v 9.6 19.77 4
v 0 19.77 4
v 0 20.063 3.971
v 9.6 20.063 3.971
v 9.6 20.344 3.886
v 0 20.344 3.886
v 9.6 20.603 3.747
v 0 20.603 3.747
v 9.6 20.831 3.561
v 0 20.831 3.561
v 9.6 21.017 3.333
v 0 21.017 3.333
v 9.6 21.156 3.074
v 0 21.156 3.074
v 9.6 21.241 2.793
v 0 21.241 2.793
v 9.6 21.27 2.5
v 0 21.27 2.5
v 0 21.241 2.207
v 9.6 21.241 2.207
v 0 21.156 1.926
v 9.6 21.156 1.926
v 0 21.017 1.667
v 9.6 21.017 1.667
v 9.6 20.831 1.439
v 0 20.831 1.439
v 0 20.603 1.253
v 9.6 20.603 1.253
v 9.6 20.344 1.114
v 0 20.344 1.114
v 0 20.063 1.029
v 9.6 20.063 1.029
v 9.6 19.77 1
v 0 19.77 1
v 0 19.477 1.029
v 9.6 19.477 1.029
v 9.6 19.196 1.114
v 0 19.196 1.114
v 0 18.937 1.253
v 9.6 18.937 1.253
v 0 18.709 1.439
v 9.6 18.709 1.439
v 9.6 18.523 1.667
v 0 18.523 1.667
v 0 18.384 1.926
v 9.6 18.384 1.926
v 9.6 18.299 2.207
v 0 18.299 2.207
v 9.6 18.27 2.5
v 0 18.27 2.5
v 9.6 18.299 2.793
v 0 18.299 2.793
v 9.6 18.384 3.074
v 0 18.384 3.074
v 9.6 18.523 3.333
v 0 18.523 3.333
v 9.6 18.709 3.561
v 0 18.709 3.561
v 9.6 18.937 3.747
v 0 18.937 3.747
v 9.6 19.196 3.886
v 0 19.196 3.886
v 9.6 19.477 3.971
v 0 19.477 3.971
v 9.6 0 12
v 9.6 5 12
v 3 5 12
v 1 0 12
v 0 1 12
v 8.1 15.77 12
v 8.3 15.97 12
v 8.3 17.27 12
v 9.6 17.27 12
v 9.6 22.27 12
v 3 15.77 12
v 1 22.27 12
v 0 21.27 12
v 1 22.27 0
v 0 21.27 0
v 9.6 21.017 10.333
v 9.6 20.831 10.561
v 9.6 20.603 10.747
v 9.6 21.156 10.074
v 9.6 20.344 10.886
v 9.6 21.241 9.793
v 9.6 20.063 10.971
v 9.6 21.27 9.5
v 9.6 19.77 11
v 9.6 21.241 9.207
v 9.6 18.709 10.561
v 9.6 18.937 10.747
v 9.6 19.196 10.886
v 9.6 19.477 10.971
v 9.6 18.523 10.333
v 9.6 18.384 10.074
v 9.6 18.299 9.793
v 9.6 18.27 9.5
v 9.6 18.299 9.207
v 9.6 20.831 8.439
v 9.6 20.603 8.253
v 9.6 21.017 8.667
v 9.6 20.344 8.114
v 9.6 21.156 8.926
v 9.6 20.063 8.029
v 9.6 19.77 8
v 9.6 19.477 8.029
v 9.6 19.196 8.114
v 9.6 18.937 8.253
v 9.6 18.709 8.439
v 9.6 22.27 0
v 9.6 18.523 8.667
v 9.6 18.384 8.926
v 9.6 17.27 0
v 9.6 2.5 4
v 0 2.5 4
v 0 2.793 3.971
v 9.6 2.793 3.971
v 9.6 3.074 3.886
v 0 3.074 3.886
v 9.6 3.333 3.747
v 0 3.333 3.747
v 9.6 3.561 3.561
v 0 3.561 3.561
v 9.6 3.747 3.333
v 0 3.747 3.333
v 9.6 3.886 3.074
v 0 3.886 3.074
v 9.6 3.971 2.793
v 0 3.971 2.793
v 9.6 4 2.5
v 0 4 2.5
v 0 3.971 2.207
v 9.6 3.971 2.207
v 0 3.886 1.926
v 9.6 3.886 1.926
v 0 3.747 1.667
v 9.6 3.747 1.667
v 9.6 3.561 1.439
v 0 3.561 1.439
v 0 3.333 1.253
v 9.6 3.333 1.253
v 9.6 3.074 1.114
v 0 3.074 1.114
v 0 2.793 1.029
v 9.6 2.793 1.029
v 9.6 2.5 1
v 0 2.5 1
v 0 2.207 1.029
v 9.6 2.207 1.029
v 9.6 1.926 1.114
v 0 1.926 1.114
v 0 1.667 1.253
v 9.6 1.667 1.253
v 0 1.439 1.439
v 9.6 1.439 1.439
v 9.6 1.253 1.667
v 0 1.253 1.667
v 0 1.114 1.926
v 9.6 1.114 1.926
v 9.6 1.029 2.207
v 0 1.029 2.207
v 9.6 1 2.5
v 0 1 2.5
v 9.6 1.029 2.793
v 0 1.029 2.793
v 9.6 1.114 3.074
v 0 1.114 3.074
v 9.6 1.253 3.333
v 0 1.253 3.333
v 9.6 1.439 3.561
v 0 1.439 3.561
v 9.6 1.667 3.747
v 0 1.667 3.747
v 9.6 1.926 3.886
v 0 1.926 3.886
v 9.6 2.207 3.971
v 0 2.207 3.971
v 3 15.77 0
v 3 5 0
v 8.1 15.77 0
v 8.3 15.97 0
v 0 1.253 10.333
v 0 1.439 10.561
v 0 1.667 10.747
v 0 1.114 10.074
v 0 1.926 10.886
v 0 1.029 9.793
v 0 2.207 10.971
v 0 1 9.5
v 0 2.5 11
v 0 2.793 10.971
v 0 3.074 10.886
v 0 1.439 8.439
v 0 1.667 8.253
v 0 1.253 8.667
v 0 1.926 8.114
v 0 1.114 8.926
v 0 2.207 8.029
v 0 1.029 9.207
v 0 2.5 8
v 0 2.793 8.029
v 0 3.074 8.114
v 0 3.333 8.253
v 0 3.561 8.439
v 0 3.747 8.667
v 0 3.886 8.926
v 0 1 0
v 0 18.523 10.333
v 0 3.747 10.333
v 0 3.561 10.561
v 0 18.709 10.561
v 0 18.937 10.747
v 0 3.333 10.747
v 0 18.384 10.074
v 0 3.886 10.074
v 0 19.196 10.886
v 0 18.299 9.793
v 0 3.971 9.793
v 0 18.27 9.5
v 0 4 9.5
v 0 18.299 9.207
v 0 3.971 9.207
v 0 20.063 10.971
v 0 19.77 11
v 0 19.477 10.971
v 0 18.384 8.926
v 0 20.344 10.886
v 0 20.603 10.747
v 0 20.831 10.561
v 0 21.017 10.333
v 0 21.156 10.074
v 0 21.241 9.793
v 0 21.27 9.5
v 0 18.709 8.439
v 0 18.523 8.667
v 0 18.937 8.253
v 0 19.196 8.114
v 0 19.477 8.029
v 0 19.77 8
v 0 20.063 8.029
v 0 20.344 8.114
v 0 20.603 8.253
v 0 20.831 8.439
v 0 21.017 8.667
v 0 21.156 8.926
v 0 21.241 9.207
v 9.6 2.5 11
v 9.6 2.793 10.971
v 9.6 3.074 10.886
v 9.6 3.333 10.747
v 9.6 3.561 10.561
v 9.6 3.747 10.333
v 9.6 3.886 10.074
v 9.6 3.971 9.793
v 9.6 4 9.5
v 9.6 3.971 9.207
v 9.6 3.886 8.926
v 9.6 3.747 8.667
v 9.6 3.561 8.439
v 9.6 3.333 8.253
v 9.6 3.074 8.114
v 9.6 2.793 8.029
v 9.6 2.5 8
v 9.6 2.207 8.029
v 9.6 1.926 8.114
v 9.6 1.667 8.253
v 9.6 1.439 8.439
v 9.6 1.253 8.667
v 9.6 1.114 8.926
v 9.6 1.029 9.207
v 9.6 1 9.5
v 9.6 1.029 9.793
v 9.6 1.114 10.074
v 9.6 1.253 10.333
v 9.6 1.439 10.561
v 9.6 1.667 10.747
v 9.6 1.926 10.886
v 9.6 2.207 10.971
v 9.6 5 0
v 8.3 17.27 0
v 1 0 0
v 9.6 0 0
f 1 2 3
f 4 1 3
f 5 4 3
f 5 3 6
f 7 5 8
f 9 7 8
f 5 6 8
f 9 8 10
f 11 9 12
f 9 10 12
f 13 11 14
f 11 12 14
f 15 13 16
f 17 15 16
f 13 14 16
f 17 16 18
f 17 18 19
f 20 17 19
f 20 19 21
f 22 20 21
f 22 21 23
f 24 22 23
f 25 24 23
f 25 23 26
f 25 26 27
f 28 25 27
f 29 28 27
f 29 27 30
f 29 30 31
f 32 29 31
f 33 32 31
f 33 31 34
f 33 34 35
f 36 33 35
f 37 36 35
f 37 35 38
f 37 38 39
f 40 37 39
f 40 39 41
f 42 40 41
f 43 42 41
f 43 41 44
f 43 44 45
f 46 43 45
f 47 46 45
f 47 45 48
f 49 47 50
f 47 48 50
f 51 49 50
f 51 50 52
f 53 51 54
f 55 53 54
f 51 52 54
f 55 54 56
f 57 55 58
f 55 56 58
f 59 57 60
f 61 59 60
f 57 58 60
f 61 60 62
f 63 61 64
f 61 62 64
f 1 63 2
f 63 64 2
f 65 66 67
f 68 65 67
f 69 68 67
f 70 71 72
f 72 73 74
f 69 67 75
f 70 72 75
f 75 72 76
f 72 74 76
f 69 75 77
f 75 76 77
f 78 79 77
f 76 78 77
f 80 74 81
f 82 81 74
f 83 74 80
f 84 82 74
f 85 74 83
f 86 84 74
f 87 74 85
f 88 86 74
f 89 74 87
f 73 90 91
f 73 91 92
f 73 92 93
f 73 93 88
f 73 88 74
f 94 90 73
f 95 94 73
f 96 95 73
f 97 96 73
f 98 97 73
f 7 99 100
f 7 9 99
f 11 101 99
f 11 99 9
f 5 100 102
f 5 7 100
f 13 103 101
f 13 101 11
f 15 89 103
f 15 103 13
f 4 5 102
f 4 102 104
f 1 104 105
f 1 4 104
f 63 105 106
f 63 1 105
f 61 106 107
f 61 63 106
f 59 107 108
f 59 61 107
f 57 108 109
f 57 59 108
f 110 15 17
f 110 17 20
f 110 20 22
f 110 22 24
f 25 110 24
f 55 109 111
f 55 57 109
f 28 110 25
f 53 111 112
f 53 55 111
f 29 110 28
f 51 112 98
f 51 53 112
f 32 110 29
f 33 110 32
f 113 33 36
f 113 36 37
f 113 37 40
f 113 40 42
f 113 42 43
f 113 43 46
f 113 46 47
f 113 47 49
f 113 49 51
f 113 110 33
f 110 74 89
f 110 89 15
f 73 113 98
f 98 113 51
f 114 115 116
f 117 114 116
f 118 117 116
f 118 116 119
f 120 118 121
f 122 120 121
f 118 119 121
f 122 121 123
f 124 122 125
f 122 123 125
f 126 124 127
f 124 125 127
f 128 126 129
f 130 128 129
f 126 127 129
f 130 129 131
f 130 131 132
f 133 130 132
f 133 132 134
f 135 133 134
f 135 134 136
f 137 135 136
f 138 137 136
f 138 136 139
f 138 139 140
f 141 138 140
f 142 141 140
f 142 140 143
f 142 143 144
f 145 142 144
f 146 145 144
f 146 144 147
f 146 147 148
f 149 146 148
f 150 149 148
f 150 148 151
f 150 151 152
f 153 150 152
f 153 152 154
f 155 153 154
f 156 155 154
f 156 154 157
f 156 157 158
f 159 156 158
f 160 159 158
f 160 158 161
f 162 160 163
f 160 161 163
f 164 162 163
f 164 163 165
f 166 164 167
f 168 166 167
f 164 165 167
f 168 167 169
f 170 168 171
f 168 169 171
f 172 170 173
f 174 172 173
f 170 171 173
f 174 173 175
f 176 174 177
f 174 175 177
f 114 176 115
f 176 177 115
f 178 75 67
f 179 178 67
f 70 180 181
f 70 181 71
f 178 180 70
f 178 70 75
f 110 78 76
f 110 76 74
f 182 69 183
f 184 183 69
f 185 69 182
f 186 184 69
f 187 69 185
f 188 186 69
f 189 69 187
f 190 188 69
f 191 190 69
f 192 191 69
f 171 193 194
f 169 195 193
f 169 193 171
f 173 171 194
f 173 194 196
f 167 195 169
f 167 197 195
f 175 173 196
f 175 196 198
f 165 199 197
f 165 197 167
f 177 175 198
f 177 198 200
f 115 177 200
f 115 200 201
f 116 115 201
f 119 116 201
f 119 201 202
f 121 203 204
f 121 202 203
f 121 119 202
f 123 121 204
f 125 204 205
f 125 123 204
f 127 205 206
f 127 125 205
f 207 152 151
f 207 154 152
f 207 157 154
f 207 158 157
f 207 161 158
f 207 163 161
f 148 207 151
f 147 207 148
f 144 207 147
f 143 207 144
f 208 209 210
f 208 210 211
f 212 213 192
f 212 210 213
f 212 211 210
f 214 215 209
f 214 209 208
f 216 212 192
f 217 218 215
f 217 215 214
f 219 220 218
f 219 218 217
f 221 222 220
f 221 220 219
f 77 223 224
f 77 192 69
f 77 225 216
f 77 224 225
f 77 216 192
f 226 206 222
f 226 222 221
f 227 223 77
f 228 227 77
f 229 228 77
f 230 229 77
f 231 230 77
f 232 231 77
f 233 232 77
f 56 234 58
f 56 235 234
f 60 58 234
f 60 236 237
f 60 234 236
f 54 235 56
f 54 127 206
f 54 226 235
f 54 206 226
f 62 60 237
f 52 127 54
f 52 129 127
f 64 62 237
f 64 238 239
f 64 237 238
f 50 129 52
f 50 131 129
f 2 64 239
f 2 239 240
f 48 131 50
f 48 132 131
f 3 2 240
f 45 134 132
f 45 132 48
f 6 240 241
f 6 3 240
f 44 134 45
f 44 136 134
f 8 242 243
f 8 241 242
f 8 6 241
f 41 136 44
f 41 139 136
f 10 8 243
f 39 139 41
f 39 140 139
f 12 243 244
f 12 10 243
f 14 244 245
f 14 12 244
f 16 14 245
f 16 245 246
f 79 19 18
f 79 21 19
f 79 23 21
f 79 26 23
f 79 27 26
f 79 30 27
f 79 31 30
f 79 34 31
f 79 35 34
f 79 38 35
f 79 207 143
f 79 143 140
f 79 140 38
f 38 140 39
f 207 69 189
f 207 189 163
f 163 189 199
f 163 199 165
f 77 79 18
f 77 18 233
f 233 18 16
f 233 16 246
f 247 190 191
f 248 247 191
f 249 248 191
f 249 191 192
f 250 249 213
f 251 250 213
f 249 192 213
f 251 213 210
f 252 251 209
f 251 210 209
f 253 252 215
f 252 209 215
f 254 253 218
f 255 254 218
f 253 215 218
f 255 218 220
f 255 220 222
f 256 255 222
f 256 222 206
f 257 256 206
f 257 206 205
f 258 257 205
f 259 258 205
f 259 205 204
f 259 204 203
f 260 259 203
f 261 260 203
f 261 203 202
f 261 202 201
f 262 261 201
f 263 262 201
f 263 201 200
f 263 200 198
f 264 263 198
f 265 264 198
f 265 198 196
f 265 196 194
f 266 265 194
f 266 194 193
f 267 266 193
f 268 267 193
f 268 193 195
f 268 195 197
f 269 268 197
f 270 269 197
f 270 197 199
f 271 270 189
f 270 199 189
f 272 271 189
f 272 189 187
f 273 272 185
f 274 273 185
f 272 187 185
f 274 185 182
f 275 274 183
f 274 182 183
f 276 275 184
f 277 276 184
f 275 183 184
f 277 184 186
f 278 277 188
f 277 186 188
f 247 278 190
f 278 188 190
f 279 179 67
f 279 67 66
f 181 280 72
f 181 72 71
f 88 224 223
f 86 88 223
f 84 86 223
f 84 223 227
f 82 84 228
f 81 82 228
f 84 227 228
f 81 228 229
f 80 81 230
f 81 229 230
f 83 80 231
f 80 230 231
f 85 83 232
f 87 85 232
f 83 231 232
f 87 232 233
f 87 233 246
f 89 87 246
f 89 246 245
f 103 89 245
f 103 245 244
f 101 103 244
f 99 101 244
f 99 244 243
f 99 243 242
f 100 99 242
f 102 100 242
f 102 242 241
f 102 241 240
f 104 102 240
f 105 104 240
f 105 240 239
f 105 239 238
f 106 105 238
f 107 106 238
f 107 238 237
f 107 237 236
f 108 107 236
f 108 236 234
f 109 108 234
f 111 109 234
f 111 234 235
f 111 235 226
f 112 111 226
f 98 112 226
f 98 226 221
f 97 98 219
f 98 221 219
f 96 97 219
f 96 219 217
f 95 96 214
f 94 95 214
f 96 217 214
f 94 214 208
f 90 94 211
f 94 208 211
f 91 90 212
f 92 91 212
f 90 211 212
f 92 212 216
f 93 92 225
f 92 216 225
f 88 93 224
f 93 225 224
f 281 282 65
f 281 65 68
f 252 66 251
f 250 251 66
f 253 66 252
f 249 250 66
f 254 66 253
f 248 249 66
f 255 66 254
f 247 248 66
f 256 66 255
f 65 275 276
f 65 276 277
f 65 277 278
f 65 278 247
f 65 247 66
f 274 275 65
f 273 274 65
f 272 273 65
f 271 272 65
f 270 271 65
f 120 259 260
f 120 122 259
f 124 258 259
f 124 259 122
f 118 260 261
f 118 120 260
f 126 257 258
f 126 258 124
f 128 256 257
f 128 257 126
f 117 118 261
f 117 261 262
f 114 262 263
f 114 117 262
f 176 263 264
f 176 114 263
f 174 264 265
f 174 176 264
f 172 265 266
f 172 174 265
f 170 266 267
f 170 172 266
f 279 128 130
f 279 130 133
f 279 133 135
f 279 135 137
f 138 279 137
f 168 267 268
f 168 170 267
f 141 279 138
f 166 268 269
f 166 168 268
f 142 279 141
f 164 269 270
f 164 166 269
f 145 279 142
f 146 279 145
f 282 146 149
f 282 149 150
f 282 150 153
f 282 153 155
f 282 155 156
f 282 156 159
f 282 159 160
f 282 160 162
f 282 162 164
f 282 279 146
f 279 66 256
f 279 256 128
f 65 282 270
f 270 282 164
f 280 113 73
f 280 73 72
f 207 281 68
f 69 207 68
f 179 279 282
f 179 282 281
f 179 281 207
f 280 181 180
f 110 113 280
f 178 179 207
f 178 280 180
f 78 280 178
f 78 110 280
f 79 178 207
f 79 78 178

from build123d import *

# Parameters (mm, degrees)
EXTRUDE_1_DEPTH     = 12
CHAMFER_1_SIZE      = 0.2
SKETCH_2_R          = 1.5
CUT_EXTRUDE_1_DEPTH = 28.057584889
CHAMFER_2_SIZE      = 1


with BuildPart() as part:
    # 草图1 → 凸台-拉伸1 (new body)
    with BuildSketch(Plane.XY):
        Polygon((0, 0), (0, 22.27), (9.6, 22.27), (9.6, 17.27), (8.3, 17.27), (8.3, 15.77), (3, 15.77), (3, 5), (9.6, 5), (9.6, 0), align=None)
    extrude(amount=EXTRUDE_1_DEPTH)

    # 倒角1
    chamfer_1_edges = [part.edges().sort_by_distance(p)[0] for p in [
        (8.3, 15.77, 6),
    ]]
    chamfer(chamfer_1_edges, length=CHAMFER_1_SIZE)

    # 草图2 → 切除-拉伸1 (cut, through all)
    with BuildSketch(Plane.ZY):
        with Locations((9.5, 19.77)):
            Circle(SKETCH_2_R)
        with Locations((2.5, 19.77)):
            Circle(SKETCH_2_R)
        with Locations((2.5, 2.5)):
            Circle(SKETCH_2_R)
        with Locations((9.5, 2.5)):
            Circle(SKETCH_2_R)
    extrude(amount=-CUT_EXTRUDE_1_DEPTH, mode=Mode.SUBTRACT)

    # 倒角2
    chamfer_2_edges = [part.edges().sort_by_distance(p)[0] for p in [
        (0, 0, 6),
        (0, 22.27, 6),
    ]]
    chamfer(chamfer_2_edges, length=CHAMFER_2_SIZE - 0.0001)  # a hair under: the kernel refuses the full size


solid = part.part
